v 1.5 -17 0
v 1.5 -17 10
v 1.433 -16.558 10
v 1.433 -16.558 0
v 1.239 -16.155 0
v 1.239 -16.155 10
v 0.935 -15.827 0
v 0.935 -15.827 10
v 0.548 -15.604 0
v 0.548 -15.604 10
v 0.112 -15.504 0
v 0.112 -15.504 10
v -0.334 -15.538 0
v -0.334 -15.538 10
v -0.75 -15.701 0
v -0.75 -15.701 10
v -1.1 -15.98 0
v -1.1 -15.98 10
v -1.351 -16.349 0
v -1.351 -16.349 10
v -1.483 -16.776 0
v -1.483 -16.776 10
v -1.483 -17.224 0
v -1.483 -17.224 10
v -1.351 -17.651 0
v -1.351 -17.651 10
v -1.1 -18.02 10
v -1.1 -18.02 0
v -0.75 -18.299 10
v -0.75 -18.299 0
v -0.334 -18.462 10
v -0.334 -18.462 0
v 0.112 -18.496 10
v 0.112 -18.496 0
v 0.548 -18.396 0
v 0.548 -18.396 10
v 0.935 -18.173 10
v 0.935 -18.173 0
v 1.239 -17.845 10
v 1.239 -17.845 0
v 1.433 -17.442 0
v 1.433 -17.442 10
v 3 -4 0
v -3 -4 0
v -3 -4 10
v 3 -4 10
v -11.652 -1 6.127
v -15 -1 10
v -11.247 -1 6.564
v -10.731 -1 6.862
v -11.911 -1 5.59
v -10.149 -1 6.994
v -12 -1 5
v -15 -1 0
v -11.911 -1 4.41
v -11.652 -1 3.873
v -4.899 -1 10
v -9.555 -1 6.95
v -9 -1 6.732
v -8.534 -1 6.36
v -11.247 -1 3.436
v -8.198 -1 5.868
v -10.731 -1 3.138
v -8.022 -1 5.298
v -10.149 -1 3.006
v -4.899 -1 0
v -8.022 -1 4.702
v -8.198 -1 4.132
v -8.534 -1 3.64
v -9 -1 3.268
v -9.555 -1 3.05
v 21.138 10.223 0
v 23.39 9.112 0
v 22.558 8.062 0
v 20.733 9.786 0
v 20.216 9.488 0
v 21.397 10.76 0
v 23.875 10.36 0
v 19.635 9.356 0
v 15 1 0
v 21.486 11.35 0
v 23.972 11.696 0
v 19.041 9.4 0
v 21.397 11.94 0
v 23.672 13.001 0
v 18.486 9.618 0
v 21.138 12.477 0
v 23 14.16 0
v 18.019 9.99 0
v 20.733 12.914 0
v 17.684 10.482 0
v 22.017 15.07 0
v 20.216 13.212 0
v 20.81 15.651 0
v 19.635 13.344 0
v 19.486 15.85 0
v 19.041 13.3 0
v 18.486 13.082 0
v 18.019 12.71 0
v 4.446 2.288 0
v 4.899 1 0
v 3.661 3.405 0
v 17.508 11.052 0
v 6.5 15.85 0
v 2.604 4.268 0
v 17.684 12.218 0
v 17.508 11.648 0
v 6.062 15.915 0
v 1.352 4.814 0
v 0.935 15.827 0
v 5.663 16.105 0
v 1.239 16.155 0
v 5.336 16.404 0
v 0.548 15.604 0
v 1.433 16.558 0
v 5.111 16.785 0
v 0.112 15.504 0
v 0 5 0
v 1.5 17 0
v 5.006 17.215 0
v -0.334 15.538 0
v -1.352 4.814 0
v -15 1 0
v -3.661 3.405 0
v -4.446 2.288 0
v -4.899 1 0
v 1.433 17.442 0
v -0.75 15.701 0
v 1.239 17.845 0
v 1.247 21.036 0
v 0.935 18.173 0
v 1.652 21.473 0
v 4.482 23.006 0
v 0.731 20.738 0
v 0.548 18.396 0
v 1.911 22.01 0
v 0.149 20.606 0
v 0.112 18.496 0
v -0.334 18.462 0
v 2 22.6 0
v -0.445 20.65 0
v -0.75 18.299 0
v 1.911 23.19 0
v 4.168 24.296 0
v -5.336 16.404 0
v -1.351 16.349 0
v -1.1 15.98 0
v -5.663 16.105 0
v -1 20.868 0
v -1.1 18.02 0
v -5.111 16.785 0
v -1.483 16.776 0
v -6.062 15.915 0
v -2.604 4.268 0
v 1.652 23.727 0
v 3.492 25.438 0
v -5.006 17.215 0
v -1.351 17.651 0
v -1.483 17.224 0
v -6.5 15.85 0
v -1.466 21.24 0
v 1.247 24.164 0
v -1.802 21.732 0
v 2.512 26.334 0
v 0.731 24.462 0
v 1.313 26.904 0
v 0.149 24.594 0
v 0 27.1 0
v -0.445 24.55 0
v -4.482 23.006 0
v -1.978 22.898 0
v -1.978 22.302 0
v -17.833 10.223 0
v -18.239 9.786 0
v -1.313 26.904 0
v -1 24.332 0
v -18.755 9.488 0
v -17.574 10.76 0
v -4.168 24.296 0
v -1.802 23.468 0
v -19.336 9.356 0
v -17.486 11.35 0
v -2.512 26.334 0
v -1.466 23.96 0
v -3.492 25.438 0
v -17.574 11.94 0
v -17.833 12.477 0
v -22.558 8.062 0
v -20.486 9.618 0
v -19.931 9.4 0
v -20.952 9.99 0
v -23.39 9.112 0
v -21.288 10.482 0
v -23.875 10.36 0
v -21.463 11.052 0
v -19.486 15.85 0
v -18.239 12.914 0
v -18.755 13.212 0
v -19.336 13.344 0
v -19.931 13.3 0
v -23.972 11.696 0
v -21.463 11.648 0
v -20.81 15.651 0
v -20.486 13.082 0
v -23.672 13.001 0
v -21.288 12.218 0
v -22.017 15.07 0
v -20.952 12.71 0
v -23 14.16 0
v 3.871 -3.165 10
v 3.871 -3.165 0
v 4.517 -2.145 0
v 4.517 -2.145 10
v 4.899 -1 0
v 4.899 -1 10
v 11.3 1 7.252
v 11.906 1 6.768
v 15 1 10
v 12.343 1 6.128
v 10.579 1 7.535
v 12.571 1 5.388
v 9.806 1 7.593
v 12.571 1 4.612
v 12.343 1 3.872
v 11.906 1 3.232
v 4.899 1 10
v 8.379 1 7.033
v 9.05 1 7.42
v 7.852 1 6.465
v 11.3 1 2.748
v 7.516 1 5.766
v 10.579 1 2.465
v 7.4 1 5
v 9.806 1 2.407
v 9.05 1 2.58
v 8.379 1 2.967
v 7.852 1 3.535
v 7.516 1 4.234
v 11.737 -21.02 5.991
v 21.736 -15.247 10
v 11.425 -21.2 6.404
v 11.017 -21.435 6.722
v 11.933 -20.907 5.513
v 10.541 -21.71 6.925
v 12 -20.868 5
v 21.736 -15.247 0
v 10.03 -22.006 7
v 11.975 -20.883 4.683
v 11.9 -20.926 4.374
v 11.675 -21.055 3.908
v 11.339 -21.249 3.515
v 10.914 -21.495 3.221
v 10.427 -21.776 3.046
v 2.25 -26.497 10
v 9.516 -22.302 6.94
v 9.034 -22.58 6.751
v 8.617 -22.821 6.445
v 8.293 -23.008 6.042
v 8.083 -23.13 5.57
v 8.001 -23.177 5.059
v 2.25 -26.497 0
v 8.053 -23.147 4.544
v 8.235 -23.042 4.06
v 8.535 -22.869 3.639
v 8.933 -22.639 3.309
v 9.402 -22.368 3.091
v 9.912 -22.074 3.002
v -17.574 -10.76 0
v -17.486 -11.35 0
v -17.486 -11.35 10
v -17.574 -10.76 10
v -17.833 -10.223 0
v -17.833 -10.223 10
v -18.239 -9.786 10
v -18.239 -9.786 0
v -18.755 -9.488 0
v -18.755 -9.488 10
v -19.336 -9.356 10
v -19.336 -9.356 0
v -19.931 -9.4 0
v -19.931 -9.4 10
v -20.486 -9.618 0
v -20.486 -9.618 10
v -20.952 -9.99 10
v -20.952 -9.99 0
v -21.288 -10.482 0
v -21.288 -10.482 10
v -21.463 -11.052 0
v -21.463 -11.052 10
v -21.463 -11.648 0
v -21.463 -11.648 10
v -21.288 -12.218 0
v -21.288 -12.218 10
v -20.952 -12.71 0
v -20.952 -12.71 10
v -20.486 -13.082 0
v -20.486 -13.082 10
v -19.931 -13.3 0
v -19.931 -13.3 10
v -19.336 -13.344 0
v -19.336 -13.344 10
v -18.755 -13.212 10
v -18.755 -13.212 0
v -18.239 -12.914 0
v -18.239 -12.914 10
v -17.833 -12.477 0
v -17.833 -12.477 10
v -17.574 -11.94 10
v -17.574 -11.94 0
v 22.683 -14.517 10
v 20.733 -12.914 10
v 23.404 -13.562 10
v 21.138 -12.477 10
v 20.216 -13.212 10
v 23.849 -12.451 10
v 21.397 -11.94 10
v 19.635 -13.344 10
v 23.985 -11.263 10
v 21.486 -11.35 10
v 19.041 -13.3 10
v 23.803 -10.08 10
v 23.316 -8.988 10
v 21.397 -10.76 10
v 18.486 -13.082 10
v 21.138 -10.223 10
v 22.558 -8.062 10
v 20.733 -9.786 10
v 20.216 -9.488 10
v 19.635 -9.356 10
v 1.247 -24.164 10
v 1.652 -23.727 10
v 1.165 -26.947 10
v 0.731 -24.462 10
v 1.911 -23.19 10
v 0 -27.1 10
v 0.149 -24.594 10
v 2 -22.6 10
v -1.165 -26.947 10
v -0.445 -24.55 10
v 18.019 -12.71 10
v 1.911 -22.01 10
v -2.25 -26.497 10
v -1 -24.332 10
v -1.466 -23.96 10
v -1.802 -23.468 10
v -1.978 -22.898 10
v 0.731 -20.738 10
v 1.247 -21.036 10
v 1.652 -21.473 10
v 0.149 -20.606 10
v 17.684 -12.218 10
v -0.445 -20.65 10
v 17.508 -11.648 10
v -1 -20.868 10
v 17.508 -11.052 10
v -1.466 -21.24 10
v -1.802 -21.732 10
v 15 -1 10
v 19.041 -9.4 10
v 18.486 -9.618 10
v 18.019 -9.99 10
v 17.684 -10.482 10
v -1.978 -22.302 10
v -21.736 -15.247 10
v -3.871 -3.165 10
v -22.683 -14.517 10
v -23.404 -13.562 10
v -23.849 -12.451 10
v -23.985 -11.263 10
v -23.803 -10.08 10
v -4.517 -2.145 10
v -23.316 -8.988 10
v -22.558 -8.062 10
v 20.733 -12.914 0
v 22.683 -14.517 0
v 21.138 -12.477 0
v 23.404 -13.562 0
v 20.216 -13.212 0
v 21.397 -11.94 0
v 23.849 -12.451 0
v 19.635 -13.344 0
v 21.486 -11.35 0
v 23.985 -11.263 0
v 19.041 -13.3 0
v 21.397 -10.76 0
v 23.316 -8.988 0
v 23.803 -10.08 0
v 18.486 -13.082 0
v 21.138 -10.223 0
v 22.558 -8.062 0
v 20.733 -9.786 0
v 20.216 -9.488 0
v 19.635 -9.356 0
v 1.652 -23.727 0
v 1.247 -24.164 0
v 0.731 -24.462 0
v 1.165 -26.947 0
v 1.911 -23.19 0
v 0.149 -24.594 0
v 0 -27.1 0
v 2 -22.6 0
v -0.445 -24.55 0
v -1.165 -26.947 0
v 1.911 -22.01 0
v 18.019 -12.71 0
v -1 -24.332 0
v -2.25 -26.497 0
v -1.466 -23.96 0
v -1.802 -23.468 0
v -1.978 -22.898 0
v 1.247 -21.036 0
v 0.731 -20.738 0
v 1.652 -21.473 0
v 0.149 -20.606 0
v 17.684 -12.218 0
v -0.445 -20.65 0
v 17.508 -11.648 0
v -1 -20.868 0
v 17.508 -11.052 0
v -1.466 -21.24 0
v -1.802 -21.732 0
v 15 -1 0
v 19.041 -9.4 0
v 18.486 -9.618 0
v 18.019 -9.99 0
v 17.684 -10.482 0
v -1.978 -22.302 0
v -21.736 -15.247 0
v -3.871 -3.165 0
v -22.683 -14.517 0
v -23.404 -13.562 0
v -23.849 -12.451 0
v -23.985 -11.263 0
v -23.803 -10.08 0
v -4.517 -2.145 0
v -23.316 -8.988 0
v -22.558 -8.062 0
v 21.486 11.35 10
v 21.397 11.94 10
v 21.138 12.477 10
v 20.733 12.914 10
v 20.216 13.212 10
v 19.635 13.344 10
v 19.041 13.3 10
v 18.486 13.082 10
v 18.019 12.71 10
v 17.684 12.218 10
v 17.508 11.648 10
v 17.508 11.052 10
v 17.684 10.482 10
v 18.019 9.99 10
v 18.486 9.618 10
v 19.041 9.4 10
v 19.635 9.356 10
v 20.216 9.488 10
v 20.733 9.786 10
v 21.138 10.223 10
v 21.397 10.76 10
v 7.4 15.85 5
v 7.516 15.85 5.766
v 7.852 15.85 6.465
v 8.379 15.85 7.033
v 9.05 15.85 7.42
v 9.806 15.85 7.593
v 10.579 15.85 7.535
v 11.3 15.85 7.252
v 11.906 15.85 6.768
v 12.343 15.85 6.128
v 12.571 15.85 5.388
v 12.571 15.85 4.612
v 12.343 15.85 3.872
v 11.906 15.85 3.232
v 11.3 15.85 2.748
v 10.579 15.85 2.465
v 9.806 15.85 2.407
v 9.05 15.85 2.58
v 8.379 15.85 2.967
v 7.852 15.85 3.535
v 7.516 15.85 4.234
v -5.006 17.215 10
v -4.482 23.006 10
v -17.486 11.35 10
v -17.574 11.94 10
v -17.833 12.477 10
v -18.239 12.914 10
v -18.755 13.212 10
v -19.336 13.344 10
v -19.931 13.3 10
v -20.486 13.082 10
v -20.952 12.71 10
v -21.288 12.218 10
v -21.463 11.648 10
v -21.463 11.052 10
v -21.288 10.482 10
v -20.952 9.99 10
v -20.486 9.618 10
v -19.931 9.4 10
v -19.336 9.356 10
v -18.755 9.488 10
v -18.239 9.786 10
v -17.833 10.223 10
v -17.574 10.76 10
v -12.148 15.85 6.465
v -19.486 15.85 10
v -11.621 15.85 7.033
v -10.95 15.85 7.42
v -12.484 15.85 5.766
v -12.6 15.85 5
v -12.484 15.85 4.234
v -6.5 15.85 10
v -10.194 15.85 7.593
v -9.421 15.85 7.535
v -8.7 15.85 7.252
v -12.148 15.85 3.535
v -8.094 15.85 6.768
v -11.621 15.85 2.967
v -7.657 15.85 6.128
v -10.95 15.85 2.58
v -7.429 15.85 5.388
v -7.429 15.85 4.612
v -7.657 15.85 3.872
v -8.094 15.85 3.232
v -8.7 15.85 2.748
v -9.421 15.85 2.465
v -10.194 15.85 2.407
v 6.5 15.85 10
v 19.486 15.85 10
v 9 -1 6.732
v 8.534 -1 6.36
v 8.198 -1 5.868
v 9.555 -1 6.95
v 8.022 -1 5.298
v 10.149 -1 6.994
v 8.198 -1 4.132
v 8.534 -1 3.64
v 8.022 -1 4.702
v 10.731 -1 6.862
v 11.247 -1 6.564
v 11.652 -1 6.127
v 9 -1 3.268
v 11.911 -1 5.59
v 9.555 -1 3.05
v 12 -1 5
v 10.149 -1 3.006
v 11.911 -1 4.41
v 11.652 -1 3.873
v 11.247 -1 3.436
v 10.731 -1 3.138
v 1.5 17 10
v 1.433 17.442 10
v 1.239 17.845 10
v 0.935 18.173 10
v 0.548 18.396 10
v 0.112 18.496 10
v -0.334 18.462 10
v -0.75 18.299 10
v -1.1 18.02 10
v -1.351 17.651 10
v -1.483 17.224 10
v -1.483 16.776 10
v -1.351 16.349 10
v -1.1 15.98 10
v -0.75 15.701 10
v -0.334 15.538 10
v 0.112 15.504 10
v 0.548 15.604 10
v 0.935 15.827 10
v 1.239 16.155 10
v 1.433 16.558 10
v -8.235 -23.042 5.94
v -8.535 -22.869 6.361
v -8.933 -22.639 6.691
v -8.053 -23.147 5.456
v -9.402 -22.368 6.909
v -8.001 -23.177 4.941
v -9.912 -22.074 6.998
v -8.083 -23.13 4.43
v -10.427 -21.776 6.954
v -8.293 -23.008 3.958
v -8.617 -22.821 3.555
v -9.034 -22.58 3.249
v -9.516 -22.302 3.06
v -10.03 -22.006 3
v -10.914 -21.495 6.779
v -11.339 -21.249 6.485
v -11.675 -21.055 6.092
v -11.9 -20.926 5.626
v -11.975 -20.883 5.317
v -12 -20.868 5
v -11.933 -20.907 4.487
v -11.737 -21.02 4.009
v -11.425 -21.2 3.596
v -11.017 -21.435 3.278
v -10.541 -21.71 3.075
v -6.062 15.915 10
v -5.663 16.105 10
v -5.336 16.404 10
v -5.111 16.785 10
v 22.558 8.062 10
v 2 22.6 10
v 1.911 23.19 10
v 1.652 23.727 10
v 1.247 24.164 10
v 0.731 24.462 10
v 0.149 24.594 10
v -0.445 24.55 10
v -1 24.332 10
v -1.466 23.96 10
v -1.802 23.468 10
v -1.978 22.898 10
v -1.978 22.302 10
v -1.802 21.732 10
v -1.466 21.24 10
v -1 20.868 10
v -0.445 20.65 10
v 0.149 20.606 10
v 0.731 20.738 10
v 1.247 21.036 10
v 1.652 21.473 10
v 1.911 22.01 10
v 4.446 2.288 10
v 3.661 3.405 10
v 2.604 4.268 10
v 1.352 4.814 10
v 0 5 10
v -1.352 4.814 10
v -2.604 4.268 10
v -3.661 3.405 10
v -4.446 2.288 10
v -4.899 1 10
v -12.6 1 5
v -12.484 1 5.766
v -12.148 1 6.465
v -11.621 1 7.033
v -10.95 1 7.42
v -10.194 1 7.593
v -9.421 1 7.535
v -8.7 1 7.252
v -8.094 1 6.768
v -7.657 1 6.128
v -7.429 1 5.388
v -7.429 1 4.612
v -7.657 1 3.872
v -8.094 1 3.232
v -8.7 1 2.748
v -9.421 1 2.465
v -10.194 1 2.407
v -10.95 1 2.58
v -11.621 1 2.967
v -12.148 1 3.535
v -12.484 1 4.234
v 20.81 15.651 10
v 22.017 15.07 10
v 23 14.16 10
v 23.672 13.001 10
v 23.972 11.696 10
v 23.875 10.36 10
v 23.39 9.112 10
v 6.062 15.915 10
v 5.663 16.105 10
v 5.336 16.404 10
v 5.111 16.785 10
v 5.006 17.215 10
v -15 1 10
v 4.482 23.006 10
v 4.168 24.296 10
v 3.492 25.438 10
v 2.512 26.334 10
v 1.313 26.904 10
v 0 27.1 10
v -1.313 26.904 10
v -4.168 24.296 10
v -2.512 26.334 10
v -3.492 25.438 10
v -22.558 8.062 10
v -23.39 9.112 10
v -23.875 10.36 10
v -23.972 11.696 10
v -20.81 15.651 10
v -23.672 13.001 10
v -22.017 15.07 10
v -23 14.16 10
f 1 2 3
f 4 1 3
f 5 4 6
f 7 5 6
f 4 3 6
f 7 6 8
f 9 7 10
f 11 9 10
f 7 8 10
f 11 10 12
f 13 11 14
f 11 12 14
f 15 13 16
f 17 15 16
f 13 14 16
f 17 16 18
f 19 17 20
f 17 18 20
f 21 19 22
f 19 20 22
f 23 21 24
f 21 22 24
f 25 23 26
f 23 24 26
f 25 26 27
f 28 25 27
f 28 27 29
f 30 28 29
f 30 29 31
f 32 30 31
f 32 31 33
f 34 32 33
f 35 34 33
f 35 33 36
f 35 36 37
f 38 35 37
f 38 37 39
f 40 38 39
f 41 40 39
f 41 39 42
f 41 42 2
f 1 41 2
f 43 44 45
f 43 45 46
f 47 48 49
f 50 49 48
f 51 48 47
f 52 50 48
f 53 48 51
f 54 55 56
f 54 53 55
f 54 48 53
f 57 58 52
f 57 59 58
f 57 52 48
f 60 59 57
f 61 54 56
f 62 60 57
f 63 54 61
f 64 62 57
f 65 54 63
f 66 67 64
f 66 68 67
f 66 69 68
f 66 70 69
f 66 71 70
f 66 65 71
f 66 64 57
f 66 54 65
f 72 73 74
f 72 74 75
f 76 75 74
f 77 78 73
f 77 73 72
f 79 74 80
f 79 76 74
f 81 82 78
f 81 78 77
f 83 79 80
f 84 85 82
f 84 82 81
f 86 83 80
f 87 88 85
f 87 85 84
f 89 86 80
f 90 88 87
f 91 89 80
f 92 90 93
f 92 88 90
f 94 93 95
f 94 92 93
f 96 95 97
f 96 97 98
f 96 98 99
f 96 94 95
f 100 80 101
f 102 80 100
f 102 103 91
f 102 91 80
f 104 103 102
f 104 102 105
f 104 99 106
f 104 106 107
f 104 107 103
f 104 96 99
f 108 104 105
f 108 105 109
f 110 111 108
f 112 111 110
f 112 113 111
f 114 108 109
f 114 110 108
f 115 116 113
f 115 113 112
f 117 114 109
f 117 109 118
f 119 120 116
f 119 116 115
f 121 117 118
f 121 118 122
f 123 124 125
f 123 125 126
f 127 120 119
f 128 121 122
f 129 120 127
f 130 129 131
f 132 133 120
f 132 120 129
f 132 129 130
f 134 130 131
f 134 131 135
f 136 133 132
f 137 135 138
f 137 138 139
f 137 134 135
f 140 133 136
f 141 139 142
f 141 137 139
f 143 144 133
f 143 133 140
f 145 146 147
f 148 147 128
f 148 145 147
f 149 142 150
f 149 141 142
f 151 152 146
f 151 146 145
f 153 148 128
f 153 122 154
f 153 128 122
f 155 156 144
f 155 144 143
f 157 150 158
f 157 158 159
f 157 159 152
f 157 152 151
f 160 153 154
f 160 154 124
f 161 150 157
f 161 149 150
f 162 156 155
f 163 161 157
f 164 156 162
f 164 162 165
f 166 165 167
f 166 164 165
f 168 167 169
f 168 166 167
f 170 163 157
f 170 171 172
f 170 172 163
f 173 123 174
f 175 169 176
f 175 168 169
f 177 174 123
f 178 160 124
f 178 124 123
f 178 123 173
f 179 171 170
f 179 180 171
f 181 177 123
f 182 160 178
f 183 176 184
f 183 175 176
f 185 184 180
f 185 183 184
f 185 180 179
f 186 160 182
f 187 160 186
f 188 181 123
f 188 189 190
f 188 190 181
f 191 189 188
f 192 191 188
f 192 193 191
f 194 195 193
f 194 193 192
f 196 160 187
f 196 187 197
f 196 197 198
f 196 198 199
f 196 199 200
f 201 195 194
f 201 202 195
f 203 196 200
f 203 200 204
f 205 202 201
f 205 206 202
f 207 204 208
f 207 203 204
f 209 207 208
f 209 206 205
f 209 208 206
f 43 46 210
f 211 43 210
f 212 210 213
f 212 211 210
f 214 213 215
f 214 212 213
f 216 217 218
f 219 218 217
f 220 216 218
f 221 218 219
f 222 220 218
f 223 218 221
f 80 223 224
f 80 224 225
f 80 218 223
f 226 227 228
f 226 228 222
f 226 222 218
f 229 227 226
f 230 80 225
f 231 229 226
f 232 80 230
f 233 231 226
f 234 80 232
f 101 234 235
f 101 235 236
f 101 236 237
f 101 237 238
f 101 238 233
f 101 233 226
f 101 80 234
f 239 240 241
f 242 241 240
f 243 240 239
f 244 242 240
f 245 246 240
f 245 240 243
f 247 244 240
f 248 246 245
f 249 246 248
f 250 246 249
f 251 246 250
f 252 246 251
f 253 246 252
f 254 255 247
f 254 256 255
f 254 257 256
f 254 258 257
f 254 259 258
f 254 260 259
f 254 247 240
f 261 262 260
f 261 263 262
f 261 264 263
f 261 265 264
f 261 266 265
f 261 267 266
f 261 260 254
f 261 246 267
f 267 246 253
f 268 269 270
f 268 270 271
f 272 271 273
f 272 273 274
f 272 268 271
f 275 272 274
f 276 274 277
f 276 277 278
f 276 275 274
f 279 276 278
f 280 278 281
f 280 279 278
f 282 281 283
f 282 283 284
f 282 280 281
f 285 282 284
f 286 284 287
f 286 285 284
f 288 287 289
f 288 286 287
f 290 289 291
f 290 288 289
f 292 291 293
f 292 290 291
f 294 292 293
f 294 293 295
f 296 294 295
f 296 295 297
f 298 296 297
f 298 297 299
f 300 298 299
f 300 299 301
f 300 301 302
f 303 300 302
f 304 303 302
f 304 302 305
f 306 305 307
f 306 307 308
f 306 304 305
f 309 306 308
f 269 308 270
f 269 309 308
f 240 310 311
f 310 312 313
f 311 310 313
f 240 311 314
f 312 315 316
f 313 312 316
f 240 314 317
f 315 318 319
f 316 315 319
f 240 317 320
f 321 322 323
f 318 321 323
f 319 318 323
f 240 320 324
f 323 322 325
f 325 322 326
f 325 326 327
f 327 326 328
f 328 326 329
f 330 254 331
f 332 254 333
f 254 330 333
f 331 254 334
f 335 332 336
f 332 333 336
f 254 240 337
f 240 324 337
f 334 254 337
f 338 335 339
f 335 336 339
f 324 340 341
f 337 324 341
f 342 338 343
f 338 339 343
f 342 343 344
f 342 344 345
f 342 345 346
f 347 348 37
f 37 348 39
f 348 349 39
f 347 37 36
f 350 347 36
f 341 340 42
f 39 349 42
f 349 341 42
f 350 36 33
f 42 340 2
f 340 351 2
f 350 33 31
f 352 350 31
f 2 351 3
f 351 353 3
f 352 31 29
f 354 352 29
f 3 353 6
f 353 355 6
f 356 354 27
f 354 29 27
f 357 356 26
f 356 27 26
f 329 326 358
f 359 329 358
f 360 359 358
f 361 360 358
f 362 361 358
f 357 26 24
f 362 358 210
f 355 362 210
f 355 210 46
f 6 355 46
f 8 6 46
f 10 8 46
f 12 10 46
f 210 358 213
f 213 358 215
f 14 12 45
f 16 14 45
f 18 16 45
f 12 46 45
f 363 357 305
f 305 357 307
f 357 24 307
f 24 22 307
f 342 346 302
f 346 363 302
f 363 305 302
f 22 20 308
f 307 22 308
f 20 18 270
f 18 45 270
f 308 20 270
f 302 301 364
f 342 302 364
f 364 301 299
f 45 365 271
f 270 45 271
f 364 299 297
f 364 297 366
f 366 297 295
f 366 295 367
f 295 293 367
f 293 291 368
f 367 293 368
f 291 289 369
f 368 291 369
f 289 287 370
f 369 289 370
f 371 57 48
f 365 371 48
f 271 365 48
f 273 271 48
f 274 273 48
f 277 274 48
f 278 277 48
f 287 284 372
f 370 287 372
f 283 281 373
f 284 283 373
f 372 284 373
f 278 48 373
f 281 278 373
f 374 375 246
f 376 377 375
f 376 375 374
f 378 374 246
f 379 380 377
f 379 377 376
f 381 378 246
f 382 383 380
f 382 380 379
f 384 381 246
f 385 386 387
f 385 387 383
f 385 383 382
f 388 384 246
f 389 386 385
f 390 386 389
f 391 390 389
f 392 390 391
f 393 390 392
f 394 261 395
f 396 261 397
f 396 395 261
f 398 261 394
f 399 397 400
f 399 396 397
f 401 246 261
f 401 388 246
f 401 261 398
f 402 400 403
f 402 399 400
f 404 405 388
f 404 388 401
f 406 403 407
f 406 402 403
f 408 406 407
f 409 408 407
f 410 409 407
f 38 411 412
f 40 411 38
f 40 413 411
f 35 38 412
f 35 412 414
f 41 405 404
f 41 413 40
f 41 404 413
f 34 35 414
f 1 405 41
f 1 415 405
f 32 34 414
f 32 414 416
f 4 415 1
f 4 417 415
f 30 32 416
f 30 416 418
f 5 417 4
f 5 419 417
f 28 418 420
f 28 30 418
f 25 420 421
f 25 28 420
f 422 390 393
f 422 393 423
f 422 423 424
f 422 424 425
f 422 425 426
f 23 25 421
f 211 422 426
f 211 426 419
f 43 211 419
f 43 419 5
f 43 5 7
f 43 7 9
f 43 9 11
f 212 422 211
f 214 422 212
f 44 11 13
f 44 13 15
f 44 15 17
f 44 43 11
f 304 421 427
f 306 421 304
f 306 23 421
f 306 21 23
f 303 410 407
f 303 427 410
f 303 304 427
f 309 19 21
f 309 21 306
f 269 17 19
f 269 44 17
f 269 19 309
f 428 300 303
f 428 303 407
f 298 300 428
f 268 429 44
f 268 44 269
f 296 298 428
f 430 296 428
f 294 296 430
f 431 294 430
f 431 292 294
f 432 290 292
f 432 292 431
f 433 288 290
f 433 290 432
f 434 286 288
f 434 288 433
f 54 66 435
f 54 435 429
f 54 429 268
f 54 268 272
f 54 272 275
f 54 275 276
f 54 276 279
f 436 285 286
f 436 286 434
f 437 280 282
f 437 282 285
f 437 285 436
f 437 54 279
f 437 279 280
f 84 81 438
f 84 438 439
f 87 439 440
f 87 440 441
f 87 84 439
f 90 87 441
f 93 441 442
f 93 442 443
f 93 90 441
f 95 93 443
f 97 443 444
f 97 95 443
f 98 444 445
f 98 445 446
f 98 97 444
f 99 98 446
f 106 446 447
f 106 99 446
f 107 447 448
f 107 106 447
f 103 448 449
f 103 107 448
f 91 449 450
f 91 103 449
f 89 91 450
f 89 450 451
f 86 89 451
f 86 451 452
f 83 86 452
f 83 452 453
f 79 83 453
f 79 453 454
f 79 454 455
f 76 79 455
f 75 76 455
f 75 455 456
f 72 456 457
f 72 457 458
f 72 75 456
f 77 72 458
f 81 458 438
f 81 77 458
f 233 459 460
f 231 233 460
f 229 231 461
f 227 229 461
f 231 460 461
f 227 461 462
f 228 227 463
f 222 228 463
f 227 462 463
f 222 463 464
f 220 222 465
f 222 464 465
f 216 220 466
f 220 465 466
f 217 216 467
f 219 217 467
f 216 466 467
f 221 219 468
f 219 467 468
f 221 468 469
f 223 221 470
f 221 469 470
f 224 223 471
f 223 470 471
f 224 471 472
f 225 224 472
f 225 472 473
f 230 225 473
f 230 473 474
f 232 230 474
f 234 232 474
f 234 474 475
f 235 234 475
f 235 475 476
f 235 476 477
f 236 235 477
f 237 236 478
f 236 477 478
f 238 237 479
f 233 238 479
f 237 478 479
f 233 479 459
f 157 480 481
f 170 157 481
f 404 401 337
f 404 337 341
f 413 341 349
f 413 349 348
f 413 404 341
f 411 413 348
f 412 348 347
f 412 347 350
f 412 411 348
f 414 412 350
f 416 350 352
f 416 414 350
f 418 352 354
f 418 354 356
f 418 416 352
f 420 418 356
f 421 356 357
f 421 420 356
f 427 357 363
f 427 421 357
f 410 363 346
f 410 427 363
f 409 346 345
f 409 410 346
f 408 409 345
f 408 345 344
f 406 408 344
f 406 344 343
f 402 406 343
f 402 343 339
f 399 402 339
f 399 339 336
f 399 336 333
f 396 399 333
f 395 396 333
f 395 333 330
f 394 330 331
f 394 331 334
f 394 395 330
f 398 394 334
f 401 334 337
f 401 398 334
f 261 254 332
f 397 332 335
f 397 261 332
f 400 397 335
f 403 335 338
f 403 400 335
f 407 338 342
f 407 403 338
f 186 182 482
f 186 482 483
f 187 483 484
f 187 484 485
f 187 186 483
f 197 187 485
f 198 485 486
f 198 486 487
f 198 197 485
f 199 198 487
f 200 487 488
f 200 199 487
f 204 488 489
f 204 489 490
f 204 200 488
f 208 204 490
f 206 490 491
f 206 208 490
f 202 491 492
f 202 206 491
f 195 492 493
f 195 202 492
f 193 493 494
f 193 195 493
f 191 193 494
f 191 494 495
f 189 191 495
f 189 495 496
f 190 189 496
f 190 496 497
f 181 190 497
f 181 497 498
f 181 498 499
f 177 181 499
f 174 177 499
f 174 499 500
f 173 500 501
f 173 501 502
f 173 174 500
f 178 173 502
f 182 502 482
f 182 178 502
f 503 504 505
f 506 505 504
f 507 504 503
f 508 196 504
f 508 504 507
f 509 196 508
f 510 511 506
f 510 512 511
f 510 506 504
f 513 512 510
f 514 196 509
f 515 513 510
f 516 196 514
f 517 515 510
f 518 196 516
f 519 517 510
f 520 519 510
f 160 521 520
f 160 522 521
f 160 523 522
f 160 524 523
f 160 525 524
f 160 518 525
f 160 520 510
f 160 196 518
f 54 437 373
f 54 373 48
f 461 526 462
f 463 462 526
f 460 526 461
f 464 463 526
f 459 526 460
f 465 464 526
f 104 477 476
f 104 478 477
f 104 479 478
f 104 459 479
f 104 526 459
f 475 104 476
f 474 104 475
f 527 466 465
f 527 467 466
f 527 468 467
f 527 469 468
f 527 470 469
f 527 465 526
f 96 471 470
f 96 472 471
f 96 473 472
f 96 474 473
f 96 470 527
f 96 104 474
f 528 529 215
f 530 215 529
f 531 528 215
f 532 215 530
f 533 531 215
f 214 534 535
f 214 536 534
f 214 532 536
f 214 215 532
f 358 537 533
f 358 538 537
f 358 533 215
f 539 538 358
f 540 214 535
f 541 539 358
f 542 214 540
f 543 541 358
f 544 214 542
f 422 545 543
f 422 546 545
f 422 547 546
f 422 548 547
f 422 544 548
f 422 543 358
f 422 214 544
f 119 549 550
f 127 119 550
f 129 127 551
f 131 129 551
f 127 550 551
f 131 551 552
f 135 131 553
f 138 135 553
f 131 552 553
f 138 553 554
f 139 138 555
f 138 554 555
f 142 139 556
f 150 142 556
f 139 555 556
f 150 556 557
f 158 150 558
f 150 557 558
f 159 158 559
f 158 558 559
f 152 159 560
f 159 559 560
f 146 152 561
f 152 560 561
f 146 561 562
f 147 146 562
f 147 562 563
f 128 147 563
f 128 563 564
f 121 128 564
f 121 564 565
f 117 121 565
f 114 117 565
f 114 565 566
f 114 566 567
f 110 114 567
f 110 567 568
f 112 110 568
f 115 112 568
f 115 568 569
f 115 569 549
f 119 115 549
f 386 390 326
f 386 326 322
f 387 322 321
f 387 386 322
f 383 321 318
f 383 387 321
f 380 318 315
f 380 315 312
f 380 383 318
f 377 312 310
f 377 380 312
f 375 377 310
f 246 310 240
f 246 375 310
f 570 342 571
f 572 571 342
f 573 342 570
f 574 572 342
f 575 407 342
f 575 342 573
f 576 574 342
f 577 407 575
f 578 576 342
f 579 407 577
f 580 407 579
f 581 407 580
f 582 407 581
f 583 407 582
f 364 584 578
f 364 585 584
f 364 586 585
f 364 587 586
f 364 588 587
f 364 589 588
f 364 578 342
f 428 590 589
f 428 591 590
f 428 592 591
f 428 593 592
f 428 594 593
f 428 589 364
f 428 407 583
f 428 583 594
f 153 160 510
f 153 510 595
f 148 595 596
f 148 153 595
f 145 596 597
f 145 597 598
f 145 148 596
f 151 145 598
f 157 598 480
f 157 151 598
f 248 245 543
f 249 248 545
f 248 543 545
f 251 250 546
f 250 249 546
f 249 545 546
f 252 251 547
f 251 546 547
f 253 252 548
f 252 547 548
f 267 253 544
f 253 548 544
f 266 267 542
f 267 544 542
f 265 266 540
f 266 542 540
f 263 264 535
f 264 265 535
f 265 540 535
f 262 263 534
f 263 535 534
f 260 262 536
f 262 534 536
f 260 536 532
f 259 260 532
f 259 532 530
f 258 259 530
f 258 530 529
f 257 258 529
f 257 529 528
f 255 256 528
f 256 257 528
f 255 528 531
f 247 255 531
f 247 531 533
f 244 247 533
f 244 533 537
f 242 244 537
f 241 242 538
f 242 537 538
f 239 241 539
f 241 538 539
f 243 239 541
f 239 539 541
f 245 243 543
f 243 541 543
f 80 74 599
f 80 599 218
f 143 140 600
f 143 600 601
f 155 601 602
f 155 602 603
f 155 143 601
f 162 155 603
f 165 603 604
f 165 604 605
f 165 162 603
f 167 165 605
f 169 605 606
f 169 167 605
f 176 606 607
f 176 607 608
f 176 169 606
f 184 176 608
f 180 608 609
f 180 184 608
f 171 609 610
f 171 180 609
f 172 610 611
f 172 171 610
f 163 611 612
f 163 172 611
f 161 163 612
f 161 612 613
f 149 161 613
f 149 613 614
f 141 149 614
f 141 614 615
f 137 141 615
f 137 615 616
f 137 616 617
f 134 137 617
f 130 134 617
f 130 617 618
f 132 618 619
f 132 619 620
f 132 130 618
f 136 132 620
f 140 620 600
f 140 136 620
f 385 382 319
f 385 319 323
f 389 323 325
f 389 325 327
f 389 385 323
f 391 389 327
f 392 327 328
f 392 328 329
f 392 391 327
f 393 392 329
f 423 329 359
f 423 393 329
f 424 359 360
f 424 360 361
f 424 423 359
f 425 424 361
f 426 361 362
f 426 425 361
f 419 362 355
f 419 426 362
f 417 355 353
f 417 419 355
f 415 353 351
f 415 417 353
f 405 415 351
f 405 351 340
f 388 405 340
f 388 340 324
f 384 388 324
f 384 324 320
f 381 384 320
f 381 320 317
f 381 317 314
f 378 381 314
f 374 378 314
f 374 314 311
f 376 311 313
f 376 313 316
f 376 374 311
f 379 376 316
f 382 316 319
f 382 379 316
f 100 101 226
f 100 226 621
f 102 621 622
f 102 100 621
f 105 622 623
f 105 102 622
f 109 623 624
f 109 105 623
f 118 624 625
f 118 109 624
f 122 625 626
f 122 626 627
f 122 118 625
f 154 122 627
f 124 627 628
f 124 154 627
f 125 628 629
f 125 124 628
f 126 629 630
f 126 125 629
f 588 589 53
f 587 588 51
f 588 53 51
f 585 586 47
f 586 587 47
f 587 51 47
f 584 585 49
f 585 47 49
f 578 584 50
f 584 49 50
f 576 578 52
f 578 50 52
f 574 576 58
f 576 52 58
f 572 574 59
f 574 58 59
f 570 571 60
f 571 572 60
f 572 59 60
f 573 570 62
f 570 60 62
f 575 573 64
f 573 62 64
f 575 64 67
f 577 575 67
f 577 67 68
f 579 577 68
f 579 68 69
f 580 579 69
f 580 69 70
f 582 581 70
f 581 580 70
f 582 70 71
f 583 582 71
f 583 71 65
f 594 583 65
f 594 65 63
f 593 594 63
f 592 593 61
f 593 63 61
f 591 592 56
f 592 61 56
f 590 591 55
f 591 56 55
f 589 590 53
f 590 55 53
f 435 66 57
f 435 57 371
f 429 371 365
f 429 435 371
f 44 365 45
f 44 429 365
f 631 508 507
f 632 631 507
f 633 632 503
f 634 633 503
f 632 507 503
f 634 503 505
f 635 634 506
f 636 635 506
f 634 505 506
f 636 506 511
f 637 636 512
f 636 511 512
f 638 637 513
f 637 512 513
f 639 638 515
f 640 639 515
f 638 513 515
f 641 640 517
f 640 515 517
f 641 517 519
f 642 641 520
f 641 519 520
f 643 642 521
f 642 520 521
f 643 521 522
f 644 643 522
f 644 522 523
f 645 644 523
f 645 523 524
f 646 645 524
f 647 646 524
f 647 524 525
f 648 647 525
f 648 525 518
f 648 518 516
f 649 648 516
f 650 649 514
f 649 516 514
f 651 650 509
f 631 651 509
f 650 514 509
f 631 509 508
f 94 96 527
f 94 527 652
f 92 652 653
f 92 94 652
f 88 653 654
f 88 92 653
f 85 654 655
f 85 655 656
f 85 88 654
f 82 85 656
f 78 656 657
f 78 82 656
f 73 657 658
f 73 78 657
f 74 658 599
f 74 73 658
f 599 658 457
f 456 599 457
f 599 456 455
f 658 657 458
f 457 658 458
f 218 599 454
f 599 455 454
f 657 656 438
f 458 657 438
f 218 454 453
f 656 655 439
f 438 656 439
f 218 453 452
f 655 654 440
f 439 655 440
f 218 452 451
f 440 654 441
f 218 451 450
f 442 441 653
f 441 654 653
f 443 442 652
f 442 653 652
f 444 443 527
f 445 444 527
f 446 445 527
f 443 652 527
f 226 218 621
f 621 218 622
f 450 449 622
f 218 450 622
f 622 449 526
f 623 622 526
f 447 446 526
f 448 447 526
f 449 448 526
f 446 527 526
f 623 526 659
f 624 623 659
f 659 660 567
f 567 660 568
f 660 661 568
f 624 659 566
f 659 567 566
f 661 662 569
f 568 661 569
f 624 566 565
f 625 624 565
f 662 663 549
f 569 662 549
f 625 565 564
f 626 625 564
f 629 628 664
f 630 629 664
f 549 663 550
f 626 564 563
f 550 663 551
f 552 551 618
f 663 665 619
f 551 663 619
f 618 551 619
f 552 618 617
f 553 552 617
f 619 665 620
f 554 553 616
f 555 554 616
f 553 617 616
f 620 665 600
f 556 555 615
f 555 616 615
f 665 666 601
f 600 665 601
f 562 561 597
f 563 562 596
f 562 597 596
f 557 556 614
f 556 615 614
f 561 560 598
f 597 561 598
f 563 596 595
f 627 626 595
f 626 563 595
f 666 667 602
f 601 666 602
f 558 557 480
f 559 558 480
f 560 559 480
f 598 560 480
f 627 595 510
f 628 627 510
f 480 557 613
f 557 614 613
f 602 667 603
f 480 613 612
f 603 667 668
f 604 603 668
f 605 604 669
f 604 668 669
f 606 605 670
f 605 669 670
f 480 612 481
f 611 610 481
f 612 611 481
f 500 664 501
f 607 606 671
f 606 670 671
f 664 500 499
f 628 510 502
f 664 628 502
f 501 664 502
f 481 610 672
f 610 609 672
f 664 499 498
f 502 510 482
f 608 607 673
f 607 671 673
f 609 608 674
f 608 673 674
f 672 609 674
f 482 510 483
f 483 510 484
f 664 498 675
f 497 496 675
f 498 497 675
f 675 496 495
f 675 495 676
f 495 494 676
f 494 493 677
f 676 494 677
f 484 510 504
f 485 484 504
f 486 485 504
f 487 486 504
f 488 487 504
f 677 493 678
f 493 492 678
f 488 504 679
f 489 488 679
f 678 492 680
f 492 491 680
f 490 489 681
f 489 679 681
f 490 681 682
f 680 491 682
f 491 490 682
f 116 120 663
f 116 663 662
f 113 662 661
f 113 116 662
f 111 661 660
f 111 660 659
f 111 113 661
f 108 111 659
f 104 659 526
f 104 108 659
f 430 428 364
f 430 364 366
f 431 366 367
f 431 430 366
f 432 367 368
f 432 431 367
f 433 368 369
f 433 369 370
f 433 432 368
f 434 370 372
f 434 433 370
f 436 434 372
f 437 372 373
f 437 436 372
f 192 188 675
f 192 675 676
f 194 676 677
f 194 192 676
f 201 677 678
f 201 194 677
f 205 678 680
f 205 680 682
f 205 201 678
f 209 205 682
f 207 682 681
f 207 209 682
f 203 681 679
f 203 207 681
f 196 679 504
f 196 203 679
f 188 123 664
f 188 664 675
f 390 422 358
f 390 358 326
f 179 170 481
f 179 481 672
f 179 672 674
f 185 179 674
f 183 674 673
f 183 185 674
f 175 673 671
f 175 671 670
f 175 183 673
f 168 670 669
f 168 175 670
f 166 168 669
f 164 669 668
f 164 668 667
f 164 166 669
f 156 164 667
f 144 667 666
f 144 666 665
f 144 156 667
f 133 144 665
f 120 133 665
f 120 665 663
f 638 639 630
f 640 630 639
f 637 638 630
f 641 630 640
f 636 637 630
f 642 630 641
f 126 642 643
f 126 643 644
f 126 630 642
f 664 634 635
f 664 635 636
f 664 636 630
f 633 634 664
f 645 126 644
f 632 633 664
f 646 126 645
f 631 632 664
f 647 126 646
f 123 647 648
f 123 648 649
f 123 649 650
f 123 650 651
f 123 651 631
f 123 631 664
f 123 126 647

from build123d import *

# Parameters (mm, degrees)
SKETCH_1_R          = 2
EXTRUDE_1_DEPTH     = 10
EXTRUDE_1_2_DEPTH   = 10
SKETCH_2_R          = 2.6
CUT_EXTRUDE_1_DEPTH = 14.85
SKETCH_3_R          = 2
CUT_EXTRUDE_2_DEPTH = 51.199702631
SKETCH_4_R          = 1.5
CUT_EXTRUDE_3_DEPTH = 38.546206789


with BuildPart() as part:
    # 草图1 → 凸台-拉伸1 (new body)
    with BuildSketch(Plane.XY):
        with BuildLine():
            Line((-3, -4), (3, -4))
            ThreePointArc((3, -4), (4.224744871, -2.674234614), (4.898979486, -1))
            Line((4.898979486, -1), (15, -1))
            Line((15, -1), (22.557859125, -8.061983991))
            ThreePointArc((22.557859125, -8.061983991), (23.956389252, -11.861653581), (21.735571585, -15.247114317))
            Line((21.735571585, -15.247114317), (2.25, -26.497114317))
            ThreePointArc((2.25, -26.497114317), (0, -27.1), (-2.25, -26.497114317))
            Line((-2.25, -26.497114317), (-21.735571585, -15.247114317))
            ThreePointArc((-21.735571585, -15.247114317), (-23.956389252, -11.861653581), (-22.557859125, -8.061983991))
            Line((-22.557859125, -8.061983991), (-15, -1))
            Line((-15, -1), (-4.898979486, -1))
            ThreePointArc((-4.898979486, -1), (-4.224744871, -2.674234614), (-3, -4))
        make_face()
        with Locations((-19.485571585, -11.35)):
            Circle(SKETCH_1_R, mode=Mode.SUBTRACT)
        with Locations((0, -22.6)):
            Circle(SKETCH_1_R, mode=Mode.SUBTRACT)
        with Locations((19.485571585, -11.35)):
            Circle(SKETCH_1_R, mode=Mode.SUBTRACT)
    extrude(amount=EXTRUDE_1_DEPTH)

    # 草图3 → 切除-拉伸2 (cut, through all)
    with BuildSketch(Plane(origin=(0, 15.85, 0), x_dir=(1, 0, 0), z_dir=(0, 1, 0))):
        with Locations(Location((-10, -5, 0), (0, 0, 180))):
            Circle(SKETCH_3_R)
        with Locations((10, -5)):
            Circle(SKETCH_3_R)
    extrude(amount=-CUT_EXTRUDE_2_DEPTH, mode=Mode.SUBTRACT)


with BuildPart() as body_2:
    # 草图1 → Extrude 1 2 (new body)
    with BuildSketch(Plane.XY):
        with BuildLine():
            Line((-15, 1), (-22.557859125, 8.061983991))
            ThreePointArc((-22.557859125, 8.061983991), (-23.671624143, 13.001352167), (-19.485571585, 15.85))
            Line((-19.485571585, 15.85), (-6.5, 15.85))
            ThreePointArc((-6.5, 15.85), (-5.488301483, 16.242540696), (-5.006113419, 17.214711852))
            Line((-5.006113419, 17.214711852), (-4.481659743, 23.005864444))
            ThreePointArc((-4.481659743, 23.005864444), (0, 27.1), (4.481659743, 23.005864444))
            Line((4.481659743, 23.005864444), (5.006113419, 17.214711852))
            ThreePointArc((5.006113419, 17.214711852), (5.488301483, 16.242540696), (6.5, 15.85))
            Line((6.5, 15.85), (19.485571585, 15.85))
            ThreePointArc((19.485571585, 15.85), (23.671624143, 13.001352167), (22.557859125, 8.061983991))
            Line((22.557859125, 8.061983991), (15, 1))
            Line((15, 1), (4.898979486, 1))
            ThreePointArc((4.898979486, 1), (0, 5), (-4.898979486, 1))
            Line((-4.898979486, 1), (-15, 1))
        make_face()
        with Locations((-19.485571585, 11.35)):
            Circle(SKETCH_1_R, mode=Mode.SUBTRACT)
        with Locations((0, 22.6)):
            Circle(SKETCH_1_R, mode=Mode.SUBTRACT)
        with Locations((19.485571585, 11.35)):
            Circle(SKETCH_1_R, mode=Mode.SUBTRACT)
    extrude(amount=EXTRUDE_1_2_DEPTH)

    # 草图2 → 切除-拉伸1 (cut)
    with BuildSketch(Plane(origin=(0, 15.85, 0), x_dir=(1, 0, 0), z_dir=(0, 1, 0))):
        with Locations(Location((-10, -5, 0), (0, 0, 180))):
            Circle(SKETCH_2_R)
        with Locations(Location((10, -5, 0), (0, 0, 180))):
            Circle(SKETCH_2_R)
    extrude(amount=-CUT_EXTRUDE_1_DEPTH, mode=Mode.SUBTRACT)


with BuildPart() as cut_extrude_3_tool:
    # 草图4 → 切除-拉伸3 (new, through all)
    with BuildSketch(Plane.XY.offset(10)):
        with Locations((0, -17)):
            Circle(SKETCH_4_R)
        with Locations((0, 17)):
            Circle(SKETCH_4_R)
    extrude(amount=-CUT_EXTRUDE_3_DEPTH)


with BuildPart() as part_1:
    add(part.part)

    # 切除-拉伸3: cut by cut_extrude_3_tool
    add(cut_extrude_3_tool.part, mode=Mode.SUBTRACT)


with BuildPart() as body_2_1:
    add(body_2.part)

    # 切除-拉伸3: cut by cut_extrude_3_tool
    add(cut_extrude_3_tool.part, mode=Mode.SUBTRACT)


solid = Compound([part_1.part, body_2_1.part])
